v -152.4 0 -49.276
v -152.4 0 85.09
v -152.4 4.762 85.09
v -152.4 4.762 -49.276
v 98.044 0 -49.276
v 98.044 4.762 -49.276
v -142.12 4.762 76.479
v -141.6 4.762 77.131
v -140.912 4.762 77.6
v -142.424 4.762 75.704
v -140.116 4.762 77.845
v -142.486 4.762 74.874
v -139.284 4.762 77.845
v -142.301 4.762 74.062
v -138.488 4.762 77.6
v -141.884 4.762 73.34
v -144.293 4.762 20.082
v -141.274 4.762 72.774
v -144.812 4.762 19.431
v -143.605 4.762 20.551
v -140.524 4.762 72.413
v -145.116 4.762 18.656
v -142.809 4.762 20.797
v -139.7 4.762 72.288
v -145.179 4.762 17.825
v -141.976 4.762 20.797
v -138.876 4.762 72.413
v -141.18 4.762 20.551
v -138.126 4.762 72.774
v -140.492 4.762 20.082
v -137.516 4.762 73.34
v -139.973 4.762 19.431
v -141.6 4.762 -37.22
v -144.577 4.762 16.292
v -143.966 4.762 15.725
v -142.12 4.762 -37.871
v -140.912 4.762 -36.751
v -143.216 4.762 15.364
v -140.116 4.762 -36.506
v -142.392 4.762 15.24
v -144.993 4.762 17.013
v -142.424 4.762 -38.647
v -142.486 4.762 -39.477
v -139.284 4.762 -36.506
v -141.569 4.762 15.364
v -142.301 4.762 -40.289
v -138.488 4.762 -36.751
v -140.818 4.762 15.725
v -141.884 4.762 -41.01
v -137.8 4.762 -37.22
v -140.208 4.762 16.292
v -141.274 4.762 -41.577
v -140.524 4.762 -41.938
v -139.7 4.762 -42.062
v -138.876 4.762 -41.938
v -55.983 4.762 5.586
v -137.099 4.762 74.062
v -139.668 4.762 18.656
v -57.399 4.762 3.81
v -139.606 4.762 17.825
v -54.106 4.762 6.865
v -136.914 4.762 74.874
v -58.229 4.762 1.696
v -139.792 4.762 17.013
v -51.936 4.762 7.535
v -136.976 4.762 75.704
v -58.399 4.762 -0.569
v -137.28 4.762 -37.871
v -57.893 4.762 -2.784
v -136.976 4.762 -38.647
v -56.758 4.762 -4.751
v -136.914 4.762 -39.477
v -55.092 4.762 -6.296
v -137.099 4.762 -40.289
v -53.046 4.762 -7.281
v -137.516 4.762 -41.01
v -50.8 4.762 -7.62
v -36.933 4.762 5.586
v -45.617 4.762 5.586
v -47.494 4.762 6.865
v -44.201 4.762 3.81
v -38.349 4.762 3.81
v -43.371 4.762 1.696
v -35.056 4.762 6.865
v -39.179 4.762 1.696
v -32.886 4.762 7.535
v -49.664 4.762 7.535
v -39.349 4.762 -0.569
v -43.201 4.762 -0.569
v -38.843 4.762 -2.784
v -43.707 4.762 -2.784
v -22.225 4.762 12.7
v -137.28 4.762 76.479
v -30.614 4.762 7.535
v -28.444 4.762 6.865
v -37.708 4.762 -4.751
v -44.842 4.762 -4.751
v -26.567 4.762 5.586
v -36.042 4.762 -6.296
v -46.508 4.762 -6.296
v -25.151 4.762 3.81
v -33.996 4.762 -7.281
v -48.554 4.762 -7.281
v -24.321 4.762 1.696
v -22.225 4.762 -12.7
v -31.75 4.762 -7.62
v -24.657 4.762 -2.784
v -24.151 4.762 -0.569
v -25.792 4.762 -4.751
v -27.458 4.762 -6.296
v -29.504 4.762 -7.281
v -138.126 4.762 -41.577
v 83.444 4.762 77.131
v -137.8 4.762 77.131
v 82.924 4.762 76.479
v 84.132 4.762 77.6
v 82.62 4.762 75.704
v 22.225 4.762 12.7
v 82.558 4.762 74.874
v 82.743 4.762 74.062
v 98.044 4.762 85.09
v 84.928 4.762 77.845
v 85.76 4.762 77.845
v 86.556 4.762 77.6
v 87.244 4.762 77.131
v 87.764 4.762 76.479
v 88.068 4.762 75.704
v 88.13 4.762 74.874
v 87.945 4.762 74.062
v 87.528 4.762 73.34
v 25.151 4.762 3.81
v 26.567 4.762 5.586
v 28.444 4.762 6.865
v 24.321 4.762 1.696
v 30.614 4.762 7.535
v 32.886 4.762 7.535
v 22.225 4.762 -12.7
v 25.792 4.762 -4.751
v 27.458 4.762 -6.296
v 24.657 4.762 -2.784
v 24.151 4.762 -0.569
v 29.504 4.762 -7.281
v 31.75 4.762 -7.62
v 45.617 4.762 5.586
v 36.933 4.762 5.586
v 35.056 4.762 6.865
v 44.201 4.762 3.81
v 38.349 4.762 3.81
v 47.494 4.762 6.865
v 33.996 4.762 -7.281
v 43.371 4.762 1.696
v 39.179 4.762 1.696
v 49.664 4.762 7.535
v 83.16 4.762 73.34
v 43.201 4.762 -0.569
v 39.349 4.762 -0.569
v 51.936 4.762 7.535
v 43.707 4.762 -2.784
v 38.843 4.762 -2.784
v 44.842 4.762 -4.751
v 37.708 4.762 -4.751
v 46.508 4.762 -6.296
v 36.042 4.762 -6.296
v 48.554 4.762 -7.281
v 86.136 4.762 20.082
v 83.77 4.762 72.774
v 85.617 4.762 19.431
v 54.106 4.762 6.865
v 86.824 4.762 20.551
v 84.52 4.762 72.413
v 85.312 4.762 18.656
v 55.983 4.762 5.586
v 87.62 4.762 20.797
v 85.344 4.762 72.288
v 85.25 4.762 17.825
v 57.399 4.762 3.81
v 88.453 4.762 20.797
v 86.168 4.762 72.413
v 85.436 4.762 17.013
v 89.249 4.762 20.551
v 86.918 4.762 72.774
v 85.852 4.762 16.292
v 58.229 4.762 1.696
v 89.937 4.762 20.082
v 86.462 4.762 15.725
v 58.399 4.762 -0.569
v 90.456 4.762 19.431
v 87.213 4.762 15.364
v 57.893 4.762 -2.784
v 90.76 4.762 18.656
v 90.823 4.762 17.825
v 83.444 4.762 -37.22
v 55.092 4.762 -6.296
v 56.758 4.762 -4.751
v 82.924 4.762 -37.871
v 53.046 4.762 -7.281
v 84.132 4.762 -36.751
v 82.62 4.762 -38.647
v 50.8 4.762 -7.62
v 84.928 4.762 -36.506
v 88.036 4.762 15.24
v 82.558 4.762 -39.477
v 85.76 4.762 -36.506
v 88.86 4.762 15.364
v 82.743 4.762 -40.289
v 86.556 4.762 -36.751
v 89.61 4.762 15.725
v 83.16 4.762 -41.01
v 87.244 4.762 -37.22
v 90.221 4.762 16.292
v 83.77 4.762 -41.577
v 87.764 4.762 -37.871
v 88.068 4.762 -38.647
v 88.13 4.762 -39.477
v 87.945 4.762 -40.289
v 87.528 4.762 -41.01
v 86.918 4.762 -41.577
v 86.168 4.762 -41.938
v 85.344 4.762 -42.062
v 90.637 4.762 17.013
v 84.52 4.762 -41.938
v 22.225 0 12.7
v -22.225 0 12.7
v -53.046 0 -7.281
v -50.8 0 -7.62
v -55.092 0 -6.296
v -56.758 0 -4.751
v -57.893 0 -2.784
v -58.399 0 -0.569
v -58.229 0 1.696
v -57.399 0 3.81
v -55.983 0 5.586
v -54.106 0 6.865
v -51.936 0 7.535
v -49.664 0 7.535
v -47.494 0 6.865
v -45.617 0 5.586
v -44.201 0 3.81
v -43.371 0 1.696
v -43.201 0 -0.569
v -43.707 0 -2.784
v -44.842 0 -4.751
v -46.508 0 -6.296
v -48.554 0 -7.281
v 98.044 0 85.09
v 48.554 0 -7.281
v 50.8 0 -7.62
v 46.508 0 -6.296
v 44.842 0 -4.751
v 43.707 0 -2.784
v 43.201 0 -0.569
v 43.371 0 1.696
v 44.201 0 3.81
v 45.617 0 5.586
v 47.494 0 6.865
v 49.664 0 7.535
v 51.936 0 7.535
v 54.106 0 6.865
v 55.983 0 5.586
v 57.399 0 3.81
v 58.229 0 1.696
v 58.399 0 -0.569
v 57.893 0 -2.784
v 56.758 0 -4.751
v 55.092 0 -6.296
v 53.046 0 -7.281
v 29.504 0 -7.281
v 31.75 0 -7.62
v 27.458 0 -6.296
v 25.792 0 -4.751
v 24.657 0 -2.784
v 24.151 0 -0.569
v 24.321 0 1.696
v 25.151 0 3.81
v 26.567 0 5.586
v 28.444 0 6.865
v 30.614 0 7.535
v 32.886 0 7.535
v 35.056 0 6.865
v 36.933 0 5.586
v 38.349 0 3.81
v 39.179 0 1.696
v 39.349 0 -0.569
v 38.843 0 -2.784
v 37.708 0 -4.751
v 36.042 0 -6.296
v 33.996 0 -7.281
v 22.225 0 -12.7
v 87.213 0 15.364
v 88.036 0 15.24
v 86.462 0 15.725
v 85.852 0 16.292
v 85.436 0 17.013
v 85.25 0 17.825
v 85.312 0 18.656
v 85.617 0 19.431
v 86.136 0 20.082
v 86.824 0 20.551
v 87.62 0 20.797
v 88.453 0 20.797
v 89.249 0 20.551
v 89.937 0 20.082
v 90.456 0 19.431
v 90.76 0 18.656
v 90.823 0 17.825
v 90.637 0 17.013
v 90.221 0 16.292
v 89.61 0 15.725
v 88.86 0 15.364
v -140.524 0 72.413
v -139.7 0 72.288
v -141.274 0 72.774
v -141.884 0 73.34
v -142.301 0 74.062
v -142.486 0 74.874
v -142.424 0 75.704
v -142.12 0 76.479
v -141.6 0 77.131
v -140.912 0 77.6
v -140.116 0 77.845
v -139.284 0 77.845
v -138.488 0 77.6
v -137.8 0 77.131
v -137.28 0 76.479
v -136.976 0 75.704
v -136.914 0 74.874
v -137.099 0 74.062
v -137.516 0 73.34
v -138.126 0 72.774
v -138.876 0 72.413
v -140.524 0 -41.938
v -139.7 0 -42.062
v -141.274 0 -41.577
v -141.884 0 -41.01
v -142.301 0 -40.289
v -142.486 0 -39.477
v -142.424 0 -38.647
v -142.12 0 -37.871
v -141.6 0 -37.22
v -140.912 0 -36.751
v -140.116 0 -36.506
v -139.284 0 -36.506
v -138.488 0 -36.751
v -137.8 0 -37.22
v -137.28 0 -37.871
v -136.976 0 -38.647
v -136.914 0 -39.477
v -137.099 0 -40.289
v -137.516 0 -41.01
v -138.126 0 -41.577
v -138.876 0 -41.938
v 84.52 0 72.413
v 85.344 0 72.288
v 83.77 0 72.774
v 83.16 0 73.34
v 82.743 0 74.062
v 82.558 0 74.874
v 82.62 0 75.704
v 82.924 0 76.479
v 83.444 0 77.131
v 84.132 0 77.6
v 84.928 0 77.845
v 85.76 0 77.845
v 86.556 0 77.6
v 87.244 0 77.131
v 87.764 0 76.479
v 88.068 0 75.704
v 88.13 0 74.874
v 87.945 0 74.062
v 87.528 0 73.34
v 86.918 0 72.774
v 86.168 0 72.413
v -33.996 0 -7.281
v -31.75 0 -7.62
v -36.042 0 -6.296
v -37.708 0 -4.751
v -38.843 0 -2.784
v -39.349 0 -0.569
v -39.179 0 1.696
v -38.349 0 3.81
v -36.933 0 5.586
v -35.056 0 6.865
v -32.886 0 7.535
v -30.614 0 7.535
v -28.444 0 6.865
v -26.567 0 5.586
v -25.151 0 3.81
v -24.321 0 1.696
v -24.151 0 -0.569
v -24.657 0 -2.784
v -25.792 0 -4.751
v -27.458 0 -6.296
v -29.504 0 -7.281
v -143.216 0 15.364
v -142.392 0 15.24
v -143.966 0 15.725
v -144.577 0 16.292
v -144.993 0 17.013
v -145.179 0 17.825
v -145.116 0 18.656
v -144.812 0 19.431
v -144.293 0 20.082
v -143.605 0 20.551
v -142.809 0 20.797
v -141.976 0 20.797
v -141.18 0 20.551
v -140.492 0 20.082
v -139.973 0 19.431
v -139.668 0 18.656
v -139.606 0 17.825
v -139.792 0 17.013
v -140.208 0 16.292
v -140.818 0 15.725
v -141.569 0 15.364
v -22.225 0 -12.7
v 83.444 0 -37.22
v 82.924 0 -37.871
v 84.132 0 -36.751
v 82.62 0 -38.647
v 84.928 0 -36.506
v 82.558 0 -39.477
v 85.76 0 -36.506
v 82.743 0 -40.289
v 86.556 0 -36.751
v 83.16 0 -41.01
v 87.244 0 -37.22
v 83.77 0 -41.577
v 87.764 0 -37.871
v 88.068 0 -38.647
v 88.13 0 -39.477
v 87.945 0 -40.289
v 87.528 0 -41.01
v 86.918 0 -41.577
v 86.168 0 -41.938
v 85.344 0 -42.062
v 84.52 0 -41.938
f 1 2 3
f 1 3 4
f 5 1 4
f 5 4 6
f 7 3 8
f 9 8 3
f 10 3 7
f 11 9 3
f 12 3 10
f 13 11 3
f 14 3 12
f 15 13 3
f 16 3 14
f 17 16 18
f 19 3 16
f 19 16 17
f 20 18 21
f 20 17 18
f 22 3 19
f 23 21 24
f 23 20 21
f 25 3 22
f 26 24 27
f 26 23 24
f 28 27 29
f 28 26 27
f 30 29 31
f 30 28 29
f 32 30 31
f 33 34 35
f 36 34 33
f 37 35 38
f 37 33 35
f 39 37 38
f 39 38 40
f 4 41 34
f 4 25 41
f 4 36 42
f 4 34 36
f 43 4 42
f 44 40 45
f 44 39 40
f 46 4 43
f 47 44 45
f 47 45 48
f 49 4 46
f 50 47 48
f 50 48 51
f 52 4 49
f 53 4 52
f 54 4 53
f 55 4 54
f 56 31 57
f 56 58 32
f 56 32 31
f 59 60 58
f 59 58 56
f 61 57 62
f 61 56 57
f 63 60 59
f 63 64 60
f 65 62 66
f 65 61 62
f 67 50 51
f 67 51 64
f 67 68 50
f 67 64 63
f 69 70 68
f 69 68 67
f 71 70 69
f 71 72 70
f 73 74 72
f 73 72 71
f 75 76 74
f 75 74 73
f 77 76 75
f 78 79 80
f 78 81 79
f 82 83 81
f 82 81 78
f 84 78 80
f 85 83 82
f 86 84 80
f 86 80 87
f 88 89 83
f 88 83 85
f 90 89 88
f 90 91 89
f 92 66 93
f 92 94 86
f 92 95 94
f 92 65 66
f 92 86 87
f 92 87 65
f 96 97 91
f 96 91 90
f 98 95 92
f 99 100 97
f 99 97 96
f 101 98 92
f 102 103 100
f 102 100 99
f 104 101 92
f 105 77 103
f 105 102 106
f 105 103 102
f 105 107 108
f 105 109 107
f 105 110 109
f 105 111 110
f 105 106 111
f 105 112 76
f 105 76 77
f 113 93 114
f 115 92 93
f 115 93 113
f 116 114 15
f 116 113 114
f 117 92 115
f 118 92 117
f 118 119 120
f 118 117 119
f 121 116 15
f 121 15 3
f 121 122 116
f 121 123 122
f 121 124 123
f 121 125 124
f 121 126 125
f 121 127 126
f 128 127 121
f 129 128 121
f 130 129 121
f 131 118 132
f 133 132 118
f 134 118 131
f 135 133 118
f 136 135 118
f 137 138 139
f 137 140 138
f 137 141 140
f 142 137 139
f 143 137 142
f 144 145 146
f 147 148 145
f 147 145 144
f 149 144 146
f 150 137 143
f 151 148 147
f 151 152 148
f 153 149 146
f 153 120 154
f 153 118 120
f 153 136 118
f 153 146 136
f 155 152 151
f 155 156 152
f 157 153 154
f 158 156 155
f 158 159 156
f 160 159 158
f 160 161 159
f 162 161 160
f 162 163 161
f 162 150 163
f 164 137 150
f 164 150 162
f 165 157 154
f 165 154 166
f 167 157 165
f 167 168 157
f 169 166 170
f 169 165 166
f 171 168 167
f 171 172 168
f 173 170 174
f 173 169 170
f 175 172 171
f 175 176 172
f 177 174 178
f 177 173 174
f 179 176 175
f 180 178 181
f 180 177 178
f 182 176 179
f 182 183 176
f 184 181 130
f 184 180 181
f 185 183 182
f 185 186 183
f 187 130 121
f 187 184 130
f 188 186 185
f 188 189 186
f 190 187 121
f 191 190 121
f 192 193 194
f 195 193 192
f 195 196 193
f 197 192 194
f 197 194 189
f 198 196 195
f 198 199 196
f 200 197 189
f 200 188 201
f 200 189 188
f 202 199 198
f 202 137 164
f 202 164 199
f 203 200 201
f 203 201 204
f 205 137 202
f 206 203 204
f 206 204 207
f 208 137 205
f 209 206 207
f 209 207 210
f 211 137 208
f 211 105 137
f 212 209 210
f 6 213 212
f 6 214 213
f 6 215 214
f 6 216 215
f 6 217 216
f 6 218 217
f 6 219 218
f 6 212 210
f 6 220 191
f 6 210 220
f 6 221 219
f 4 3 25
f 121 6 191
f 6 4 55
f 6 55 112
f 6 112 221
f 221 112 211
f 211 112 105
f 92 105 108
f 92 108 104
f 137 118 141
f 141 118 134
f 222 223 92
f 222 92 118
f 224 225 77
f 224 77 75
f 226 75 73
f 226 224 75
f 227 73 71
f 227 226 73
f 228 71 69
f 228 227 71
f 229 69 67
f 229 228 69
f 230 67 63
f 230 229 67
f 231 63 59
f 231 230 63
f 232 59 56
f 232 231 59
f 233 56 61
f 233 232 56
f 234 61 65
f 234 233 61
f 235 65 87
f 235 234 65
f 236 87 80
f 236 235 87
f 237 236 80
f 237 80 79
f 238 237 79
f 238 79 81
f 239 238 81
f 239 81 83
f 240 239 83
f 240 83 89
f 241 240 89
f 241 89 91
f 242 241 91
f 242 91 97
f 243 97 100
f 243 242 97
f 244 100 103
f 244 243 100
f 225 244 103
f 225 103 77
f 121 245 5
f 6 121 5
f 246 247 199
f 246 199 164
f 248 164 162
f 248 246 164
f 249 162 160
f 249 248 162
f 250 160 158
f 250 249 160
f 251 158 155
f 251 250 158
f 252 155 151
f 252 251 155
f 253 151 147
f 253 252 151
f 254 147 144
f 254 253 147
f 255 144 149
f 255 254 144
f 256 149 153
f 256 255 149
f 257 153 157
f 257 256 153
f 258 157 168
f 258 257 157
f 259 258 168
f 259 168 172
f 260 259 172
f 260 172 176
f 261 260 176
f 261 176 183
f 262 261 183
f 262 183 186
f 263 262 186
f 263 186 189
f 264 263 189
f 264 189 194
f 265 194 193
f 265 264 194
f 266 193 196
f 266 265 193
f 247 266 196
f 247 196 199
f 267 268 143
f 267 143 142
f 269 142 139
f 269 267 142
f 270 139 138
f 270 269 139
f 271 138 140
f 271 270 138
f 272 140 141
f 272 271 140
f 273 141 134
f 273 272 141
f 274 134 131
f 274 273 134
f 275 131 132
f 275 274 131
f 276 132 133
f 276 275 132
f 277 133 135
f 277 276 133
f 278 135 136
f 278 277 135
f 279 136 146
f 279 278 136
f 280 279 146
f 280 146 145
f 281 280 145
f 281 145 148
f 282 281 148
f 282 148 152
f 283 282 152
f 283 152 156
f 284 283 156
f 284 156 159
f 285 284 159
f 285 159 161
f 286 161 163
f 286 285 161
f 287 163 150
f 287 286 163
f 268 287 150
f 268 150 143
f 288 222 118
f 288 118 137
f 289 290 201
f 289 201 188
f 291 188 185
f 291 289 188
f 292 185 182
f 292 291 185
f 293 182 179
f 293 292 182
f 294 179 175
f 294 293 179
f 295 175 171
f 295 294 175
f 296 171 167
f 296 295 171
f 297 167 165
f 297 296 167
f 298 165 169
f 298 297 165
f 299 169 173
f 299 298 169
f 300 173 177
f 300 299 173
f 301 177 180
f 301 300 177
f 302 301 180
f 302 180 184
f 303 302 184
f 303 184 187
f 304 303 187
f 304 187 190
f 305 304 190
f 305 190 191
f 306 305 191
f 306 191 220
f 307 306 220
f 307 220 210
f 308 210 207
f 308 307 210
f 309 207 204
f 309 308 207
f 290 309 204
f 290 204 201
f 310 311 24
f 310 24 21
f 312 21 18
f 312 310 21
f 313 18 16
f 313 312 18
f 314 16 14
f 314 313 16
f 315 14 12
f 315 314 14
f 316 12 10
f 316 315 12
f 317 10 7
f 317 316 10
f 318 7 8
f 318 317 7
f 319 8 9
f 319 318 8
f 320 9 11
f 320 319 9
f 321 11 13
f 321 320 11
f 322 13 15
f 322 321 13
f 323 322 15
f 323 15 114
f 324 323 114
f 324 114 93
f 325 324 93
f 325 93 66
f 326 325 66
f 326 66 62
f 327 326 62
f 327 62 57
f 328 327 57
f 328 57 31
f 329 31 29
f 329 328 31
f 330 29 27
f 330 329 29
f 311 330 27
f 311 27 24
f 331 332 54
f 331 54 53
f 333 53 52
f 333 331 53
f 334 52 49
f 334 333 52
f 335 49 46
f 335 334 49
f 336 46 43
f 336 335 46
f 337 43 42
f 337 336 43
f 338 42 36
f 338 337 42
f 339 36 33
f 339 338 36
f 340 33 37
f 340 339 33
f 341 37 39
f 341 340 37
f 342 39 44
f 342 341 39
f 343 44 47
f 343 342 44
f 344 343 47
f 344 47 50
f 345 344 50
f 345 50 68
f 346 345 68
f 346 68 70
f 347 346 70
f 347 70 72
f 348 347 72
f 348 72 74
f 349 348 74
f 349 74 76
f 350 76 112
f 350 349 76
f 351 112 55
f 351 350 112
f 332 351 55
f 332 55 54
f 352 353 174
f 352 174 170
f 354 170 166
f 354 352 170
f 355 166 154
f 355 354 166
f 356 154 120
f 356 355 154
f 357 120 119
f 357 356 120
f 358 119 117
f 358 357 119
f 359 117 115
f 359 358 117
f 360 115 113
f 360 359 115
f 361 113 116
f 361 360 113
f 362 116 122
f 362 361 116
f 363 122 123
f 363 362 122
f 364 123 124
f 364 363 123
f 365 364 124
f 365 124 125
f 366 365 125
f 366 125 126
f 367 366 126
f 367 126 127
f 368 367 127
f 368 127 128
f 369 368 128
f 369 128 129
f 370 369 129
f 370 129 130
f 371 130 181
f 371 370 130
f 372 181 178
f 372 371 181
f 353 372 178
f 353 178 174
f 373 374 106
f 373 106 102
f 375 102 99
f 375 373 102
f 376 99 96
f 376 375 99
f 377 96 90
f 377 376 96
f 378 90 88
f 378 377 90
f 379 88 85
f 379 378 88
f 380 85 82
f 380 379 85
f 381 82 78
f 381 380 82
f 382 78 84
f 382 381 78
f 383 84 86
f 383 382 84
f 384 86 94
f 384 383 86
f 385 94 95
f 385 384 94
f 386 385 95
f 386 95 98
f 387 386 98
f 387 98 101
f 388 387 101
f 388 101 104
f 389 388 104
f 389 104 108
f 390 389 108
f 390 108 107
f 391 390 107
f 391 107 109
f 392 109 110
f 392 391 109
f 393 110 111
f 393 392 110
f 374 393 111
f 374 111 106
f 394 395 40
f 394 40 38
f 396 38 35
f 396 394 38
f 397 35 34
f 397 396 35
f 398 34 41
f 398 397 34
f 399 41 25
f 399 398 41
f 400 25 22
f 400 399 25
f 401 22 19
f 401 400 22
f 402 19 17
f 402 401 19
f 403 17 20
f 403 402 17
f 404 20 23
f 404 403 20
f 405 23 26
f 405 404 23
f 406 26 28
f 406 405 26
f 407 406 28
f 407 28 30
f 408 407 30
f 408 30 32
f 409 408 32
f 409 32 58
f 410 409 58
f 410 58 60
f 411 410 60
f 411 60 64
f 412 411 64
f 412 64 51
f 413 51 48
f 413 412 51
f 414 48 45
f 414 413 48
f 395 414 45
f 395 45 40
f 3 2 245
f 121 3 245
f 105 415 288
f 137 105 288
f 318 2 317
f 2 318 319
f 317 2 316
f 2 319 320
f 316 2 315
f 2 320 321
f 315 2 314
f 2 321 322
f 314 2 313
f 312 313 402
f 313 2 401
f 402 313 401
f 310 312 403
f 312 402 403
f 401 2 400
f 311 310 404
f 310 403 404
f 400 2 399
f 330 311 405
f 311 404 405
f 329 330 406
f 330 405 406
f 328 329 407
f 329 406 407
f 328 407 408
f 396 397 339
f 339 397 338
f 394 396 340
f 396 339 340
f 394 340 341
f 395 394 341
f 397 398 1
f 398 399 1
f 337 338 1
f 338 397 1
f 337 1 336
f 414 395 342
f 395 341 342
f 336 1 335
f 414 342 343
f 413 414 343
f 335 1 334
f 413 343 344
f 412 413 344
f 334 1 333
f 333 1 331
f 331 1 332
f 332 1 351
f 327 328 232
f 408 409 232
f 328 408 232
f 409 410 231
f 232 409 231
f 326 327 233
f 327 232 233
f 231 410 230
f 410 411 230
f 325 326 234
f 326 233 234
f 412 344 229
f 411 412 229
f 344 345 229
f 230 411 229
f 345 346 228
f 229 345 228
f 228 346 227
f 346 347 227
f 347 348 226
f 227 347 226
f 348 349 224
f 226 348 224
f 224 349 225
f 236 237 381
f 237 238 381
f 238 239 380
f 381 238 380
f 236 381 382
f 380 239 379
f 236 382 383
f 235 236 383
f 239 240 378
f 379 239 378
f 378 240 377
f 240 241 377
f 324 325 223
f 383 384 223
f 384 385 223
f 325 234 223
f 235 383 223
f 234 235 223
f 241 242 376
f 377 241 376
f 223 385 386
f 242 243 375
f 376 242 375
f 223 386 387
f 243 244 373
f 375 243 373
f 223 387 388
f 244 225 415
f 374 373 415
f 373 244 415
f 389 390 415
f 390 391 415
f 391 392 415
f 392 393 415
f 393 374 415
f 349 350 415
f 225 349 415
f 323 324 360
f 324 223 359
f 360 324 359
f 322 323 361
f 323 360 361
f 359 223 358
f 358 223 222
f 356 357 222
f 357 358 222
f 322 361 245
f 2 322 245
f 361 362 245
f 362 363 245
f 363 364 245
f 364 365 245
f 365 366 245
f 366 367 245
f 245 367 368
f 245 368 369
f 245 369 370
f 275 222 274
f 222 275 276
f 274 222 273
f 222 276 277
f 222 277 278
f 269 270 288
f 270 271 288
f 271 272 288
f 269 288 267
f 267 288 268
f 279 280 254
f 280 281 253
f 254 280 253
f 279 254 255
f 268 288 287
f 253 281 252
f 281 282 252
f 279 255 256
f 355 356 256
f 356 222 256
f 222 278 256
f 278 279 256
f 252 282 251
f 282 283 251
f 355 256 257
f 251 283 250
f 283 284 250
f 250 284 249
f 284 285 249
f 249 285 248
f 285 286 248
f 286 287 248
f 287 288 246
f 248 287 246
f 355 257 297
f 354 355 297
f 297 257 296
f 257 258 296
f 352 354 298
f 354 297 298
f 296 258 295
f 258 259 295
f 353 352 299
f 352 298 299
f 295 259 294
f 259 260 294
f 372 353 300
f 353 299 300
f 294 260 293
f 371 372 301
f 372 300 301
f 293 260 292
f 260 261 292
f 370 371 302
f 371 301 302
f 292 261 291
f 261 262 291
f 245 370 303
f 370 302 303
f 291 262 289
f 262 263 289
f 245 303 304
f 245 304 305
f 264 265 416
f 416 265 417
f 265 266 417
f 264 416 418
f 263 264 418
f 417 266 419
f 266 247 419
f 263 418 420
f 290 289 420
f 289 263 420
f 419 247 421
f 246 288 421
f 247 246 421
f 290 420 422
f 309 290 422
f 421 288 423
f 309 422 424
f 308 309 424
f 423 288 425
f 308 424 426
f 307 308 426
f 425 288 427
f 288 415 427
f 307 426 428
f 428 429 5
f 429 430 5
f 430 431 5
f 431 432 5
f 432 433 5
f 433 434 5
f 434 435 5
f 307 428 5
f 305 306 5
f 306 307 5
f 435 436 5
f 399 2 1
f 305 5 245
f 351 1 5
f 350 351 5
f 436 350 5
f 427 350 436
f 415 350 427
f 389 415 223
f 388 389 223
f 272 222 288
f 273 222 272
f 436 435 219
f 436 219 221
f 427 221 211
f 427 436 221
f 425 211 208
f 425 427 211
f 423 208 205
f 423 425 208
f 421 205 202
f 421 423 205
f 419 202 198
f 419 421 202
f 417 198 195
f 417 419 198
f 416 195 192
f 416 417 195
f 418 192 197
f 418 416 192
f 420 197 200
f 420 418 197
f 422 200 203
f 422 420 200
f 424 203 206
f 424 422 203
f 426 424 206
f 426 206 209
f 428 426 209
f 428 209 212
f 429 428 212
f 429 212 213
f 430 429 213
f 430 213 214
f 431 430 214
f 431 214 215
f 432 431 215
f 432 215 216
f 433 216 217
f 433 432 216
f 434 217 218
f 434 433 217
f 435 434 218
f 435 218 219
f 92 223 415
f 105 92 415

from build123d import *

# Parameters (mm, degrees)
SKETCH1_W           = 250.444
SKETCH1_H           = 134.366
SKETCH1_R           = 7.62
SKETCH1_R_2         = 2.794
SKETCH1_W_2         = 44.45
SKETCH1_H_2         = 25.4
BOSS_EXTRUDE1_DEPTH = 4.7625


with BuildPart() as part:
    # Sketch1 → Boss-Extrude1 (new body)
    with BuildSketch(Plane(origin=(0, 0, 0), x_dir=(1, 0, 0), z_dir=(0, 1, 0))):
        with Locations((-27.178, -17.907)):
            Rectangle(SKETCH1_W, SKETCH1_H)
        with Locations(Location((-50.8, 0, 0), (0, 0, 90))):
            Circle(SKETCH1_R, mode=Mode.SUBTRACT)
        with Locations(Location((-31.75, 0, 0), (0, 0, 90))):
            Circle(SKETCH1_R, mode=Mode.SUBTRACT)
        with Locations(Location((31.75, 0, 0), (0, 0, 90))):
            Circle(SKETCH1_R, mode=Mode.SUBTRACT)
        with Locations(Location((50.8, 0, 0), (0, 0, 90))):
            Circle(SKETCH1_R, mode=Mode.SUBTRACT)
        with Locations(Location((-139.7, 39.2684, 0), (0, 0, 90))):
            Circle(SKETCH1_R_2, mode=Mode.SUBTRACT)
        with Locations(Location((85.344, 39.2684, 0), (0, 0, 90))):
            Circle(SKETCH1_R_2, mode=Mode.SUBTRACT)
        with Locations(Location((88.0364, -18.034, 0), (0, 0, 90))):
            Circle(SKETCH1_R_2, mode=Mode.SUBTRACT)
        with Locations(Location((85.344, -75.0824, 0), (0, 0, 90))):
            Circle(SKETCH1_R_2, mode=Mode.SUBTRACT)
        with Locations(Location((-139.7, -75.0824, 0), (0, 0, 90))):
            Circle(SKETCH1_R_2, mode=Mode.SUBTRACT)
        with Locations(Location((-142.3924, -18.034, 0), (0, 0, 90))):
            Circle(SKETCH1_R_2, mode=Mode.SUBTRACT)
        Rectangle(SKETCH1_W_2, SKETCH1_H_2, mode=Mode.SUBTRACT)
    extrude(amount=BOSS_EXTRUDE1_DEPTH)


solid = part.part
